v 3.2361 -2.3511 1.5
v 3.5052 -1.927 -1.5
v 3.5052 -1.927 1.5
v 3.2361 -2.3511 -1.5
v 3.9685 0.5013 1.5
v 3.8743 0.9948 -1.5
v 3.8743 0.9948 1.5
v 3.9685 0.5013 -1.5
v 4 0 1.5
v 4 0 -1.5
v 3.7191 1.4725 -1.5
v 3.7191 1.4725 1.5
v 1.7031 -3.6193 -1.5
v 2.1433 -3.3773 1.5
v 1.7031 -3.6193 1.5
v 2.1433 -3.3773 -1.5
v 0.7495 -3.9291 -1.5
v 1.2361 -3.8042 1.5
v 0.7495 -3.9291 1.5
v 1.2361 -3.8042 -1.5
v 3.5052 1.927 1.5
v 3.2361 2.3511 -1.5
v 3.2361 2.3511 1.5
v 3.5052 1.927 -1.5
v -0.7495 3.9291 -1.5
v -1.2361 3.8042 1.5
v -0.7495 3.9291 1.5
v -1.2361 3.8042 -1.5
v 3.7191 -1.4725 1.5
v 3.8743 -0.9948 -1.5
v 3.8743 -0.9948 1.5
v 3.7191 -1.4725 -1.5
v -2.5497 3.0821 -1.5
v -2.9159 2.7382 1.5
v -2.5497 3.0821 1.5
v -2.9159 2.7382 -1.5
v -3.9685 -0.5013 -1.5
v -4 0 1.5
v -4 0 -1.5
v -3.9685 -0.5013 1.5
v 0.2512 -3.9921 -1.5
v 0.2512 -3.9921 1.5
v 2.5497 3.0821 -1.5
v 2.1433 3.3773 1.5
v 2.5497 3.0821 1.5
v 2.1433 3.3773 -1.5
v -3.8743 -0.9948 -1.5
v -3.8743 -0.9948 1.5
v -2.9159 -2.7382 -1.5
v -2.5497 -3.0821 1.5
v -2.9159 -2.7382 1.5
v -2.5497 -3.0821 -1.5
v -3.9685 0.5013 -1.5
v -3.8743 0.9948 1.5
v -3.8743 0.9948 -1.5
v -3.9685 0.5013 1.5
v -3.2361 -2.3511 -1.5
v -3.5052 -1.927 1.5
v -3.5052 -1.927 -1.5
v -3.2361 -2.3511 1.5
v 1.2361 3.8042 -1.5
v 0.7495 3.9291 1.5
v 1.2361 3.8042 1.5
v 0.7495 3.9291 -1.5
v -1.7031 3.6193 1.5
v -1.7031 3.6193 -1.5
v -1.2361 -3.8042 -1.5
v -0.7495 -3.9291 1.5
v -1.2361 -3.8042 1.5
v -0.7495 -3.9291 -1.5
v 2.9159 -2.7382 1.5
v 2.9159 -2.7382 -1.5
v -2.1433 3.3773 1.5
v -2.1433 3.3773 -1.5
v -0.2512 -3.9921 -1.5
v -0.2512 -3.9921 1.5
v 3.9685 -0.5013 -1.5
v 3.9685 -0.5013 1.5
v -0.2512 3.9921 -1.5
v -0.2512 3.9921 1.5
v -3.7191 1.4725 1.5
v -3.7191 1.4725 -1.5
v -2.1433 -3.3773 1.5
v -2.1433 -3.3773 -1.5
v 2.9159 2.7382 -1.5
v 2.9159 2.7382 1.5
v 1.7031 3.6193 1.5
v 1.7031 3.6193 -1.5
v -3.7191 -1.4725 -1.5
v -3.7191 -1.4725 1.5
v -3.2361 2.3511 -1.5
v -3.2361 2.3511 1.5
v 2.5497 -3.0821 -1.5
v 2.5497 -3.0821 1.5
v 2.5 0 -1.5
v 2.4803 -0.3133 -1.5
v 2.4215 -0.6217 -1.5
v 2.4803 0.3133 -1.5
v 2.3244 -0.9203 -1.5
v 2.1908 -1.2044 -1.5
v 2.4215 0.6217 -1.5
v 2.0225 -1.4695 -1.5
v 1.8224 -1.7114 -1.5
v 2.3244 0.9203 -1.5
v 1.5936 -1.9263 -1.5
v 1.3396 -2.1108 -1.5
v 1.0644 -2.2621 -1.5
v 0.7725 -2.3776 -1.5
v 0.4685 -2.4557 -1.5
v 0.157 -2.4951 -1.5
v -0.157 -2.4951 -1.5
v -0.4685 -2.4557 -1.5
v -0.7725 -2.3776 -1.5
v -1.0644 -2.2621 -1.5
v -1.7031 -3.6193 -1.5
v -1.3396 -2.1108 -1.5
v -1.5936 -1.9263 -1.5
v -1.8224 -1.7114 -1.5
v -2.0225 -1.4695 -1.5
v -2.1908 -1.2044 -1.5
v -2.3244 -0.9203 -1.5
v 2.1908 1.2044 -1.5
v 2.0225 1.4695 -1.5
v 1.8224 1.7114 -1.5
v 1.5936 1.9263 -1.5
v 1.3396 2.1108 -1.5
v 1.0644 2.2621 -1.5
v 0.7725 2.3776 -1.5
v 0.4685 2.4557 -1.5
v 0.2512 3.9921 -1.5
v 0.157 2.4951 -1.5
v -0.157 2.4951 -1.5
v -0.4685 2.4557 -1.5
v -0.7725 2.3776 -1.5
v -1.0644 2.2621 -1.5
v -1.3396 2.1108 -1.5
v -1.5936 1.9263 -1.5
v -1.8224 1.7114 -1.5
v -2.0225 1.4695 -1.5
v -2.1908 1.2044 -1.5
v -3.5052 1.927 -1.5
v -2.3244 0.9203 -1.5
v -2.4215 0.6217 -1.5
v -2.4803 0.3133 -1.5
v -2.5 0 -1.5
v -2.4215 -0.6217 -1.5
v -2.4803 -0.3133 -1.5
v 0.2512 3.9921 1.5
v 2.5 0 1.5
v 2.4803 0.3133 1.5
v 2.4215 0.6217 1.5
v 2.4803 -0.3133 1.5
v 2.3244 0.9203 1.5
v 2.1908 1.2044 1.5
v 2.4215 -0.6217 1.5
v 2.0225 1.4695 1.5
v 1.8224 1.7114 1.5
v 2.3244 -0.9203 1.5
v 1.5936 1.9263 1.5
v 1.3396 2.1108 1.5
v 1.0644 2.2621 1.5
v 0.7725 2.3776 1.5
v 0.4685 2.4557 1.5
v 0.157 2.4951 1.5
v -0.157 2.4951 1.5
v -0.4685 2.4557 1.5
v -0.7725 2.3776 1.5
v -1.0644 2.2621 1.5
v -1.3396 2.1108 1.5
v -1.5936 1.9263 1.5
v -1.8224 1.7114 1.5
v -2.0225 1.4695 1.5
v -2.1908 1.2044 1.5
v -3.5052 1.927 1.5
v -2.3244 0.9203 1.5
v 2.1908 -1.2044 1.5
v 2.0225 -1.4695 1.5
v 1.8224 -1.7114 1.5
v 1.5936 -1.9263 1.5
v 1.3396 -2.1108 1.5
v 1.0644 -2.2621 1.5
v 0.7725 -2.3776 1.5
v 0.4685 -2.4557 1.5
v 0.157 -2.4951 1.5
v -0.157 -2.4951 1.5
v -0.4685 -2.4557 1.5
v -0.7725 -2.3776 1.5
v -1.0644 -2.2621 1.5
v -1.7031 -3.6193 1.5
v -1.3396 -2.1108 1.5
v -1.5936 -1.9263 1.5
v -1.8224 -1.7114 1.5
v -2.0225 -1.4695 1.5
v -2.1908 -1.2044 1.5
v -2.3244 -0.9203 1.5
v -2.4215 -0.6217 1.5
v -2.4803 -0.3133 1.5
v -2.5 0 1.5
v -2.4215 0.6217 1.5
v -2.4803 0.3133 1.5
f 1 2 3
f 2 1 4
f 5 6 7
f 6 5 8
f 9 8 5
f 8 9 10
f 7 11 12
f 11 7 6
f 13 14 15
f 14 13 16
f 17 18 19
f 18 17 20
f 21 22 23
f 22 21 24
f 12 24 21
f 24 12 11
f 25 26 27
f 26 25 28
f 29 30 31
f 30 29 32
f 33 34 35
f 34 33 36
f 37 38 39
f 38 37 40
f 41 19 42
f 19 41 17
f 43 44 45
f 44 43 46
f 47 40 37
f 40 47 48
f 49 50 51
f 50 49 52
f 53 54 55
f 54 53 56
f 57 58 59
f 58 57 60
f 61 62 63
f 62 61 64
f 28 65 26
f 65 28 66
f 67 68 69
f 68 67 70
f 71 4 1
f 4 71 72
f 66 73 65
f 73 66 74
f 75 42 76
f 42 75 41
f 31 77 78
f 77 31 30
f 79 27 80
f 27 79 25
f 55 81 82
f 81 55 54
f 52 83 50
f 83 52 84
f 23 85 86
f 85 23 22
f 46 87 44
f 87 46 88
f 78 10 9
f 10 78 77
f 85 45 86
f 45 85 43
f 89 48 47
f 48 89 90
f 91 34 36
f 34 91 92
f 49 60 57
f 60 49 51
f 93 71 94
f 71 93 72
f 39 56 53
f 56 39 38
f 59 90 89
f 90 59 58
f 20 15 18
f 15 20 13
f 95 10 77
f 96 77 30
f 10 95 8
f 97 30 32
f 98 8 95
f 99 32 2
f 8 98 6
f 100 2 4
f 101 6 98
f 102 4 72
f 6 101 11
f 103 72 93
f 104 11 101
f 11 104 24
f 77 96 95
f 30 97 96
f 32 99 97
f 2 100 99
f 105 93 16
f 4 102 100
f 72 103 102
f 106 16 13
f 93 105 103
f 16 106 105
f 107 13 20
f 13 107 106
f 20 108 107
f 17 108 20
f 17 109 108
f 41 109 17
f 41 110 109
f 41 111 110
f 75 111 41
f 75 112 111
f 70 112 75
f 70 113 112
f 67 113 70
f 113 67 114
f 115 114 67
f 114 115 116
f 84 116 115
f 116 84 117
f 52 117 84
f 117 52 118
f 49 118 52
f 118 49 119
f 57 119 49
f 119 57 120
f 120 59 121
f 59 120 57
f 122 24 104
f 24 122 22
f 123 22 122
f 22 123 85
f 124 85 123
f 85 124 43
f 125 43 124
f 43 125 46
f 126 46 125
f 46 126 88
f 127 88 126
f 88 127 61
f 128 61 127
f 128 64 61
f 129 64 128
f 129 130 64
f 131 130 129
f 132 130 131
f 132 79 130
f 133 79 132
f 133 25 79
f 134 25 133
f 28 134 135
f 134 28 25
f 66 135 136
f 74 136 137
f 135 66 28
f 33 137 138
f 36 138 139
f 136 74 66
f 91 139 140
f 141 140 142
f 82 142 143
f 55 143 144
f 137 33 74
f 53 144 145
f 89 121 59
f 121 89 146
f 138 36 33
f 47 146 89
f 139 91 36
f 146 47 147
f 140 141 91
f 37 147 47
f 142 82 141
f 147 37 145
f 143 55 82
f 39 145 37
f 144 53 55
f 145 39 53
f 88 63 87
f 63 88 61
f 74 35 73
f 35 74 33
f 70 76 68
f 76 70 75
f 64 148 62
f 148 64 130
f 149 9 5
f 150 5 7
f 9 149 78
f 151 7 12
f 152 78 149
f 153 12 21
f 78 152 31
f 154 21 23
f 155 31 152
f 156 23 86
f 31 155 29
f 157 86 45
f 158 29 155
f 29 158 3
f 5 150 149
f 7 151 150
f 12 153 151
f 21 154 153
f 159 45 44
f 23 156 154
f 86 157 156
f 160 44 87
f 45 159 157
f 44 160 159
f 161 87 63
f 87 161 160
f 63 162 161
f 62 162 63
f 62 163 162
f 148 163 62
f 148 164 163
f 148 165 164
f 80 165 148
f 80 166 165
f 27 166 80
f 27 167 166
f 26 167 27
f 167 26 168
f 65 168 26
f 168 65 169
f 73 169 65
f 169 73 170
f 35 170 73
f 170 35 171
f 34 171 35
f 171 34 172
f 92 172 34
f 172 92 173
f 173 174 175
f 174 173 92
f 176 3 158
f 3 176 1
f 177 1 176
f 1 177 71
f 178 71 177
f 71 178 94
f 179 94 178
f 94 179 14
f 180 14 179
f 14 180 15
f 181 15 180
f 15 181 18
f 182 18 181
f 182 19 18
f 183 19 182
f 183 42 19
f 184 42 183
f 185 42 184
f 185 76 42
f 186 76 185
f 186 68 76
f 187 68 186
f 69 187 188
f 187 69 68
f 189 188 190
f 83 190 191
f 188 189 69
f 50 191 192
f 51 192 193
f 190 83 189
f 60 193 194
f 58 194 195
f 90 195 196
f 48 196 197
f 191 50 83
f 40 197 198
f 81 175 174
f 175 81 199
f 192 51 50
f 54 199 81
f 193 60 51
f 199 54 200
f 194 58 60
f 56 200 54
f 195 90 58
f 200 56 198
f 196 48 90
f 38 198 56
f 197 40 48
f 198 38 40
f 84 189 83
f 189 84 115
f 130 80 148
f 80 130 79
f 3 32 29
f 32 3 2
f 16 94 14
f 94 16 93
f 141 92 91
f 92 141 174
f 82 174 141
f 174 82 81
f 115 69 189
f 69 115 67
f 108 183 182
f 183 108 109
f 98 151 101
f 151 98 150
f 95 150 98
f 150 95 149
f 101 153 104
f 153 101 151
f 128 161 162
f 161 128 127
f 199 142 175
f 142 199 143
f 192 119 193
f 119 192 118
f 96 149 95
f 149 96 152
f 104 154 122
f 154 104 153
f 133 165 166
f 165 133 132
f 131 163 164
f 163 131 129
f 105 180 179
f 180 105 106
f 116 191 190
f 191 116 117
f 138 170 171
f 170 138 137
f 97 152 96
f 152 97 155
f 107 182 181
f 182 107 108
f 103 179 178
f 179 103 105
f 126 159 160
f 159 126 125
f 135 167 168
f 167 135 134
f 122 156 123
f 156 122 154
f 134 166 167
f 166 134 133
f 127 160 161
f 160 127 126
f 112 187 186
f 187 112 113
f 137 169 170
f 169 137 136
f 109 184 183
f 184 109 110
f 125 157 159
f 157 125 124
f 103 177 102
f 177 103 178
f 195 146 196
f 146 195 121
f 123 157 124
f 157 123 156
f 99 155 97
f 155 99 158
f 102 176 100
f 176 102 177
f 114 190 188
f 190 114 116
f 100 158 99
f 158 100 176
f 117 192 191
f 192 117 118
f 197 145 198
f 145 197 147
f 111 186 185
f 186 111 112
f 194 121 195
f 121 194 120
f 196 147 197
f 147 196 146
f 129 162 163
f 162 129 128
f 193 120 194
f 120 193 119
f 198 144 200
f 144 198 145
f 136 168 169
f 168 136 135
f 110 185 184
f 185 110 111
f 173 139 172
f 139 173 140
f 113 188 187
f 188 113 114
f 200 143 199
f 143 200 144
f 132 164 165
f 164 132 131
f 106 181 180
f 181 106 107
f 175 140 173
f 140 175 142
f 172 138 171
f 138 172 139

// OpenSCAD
$fn = 50;


difference() {
	union() {
		translate(v = [0, 0, -1.5000000000]) {
			cylinder(h = 3, r = 4.0000000000);
		}
	}
	union() {
		translate(v = [0, 0, -100.0000000000]) {
			cylinder(h = 200, r = 2.5000000000);
		}
	}
}
